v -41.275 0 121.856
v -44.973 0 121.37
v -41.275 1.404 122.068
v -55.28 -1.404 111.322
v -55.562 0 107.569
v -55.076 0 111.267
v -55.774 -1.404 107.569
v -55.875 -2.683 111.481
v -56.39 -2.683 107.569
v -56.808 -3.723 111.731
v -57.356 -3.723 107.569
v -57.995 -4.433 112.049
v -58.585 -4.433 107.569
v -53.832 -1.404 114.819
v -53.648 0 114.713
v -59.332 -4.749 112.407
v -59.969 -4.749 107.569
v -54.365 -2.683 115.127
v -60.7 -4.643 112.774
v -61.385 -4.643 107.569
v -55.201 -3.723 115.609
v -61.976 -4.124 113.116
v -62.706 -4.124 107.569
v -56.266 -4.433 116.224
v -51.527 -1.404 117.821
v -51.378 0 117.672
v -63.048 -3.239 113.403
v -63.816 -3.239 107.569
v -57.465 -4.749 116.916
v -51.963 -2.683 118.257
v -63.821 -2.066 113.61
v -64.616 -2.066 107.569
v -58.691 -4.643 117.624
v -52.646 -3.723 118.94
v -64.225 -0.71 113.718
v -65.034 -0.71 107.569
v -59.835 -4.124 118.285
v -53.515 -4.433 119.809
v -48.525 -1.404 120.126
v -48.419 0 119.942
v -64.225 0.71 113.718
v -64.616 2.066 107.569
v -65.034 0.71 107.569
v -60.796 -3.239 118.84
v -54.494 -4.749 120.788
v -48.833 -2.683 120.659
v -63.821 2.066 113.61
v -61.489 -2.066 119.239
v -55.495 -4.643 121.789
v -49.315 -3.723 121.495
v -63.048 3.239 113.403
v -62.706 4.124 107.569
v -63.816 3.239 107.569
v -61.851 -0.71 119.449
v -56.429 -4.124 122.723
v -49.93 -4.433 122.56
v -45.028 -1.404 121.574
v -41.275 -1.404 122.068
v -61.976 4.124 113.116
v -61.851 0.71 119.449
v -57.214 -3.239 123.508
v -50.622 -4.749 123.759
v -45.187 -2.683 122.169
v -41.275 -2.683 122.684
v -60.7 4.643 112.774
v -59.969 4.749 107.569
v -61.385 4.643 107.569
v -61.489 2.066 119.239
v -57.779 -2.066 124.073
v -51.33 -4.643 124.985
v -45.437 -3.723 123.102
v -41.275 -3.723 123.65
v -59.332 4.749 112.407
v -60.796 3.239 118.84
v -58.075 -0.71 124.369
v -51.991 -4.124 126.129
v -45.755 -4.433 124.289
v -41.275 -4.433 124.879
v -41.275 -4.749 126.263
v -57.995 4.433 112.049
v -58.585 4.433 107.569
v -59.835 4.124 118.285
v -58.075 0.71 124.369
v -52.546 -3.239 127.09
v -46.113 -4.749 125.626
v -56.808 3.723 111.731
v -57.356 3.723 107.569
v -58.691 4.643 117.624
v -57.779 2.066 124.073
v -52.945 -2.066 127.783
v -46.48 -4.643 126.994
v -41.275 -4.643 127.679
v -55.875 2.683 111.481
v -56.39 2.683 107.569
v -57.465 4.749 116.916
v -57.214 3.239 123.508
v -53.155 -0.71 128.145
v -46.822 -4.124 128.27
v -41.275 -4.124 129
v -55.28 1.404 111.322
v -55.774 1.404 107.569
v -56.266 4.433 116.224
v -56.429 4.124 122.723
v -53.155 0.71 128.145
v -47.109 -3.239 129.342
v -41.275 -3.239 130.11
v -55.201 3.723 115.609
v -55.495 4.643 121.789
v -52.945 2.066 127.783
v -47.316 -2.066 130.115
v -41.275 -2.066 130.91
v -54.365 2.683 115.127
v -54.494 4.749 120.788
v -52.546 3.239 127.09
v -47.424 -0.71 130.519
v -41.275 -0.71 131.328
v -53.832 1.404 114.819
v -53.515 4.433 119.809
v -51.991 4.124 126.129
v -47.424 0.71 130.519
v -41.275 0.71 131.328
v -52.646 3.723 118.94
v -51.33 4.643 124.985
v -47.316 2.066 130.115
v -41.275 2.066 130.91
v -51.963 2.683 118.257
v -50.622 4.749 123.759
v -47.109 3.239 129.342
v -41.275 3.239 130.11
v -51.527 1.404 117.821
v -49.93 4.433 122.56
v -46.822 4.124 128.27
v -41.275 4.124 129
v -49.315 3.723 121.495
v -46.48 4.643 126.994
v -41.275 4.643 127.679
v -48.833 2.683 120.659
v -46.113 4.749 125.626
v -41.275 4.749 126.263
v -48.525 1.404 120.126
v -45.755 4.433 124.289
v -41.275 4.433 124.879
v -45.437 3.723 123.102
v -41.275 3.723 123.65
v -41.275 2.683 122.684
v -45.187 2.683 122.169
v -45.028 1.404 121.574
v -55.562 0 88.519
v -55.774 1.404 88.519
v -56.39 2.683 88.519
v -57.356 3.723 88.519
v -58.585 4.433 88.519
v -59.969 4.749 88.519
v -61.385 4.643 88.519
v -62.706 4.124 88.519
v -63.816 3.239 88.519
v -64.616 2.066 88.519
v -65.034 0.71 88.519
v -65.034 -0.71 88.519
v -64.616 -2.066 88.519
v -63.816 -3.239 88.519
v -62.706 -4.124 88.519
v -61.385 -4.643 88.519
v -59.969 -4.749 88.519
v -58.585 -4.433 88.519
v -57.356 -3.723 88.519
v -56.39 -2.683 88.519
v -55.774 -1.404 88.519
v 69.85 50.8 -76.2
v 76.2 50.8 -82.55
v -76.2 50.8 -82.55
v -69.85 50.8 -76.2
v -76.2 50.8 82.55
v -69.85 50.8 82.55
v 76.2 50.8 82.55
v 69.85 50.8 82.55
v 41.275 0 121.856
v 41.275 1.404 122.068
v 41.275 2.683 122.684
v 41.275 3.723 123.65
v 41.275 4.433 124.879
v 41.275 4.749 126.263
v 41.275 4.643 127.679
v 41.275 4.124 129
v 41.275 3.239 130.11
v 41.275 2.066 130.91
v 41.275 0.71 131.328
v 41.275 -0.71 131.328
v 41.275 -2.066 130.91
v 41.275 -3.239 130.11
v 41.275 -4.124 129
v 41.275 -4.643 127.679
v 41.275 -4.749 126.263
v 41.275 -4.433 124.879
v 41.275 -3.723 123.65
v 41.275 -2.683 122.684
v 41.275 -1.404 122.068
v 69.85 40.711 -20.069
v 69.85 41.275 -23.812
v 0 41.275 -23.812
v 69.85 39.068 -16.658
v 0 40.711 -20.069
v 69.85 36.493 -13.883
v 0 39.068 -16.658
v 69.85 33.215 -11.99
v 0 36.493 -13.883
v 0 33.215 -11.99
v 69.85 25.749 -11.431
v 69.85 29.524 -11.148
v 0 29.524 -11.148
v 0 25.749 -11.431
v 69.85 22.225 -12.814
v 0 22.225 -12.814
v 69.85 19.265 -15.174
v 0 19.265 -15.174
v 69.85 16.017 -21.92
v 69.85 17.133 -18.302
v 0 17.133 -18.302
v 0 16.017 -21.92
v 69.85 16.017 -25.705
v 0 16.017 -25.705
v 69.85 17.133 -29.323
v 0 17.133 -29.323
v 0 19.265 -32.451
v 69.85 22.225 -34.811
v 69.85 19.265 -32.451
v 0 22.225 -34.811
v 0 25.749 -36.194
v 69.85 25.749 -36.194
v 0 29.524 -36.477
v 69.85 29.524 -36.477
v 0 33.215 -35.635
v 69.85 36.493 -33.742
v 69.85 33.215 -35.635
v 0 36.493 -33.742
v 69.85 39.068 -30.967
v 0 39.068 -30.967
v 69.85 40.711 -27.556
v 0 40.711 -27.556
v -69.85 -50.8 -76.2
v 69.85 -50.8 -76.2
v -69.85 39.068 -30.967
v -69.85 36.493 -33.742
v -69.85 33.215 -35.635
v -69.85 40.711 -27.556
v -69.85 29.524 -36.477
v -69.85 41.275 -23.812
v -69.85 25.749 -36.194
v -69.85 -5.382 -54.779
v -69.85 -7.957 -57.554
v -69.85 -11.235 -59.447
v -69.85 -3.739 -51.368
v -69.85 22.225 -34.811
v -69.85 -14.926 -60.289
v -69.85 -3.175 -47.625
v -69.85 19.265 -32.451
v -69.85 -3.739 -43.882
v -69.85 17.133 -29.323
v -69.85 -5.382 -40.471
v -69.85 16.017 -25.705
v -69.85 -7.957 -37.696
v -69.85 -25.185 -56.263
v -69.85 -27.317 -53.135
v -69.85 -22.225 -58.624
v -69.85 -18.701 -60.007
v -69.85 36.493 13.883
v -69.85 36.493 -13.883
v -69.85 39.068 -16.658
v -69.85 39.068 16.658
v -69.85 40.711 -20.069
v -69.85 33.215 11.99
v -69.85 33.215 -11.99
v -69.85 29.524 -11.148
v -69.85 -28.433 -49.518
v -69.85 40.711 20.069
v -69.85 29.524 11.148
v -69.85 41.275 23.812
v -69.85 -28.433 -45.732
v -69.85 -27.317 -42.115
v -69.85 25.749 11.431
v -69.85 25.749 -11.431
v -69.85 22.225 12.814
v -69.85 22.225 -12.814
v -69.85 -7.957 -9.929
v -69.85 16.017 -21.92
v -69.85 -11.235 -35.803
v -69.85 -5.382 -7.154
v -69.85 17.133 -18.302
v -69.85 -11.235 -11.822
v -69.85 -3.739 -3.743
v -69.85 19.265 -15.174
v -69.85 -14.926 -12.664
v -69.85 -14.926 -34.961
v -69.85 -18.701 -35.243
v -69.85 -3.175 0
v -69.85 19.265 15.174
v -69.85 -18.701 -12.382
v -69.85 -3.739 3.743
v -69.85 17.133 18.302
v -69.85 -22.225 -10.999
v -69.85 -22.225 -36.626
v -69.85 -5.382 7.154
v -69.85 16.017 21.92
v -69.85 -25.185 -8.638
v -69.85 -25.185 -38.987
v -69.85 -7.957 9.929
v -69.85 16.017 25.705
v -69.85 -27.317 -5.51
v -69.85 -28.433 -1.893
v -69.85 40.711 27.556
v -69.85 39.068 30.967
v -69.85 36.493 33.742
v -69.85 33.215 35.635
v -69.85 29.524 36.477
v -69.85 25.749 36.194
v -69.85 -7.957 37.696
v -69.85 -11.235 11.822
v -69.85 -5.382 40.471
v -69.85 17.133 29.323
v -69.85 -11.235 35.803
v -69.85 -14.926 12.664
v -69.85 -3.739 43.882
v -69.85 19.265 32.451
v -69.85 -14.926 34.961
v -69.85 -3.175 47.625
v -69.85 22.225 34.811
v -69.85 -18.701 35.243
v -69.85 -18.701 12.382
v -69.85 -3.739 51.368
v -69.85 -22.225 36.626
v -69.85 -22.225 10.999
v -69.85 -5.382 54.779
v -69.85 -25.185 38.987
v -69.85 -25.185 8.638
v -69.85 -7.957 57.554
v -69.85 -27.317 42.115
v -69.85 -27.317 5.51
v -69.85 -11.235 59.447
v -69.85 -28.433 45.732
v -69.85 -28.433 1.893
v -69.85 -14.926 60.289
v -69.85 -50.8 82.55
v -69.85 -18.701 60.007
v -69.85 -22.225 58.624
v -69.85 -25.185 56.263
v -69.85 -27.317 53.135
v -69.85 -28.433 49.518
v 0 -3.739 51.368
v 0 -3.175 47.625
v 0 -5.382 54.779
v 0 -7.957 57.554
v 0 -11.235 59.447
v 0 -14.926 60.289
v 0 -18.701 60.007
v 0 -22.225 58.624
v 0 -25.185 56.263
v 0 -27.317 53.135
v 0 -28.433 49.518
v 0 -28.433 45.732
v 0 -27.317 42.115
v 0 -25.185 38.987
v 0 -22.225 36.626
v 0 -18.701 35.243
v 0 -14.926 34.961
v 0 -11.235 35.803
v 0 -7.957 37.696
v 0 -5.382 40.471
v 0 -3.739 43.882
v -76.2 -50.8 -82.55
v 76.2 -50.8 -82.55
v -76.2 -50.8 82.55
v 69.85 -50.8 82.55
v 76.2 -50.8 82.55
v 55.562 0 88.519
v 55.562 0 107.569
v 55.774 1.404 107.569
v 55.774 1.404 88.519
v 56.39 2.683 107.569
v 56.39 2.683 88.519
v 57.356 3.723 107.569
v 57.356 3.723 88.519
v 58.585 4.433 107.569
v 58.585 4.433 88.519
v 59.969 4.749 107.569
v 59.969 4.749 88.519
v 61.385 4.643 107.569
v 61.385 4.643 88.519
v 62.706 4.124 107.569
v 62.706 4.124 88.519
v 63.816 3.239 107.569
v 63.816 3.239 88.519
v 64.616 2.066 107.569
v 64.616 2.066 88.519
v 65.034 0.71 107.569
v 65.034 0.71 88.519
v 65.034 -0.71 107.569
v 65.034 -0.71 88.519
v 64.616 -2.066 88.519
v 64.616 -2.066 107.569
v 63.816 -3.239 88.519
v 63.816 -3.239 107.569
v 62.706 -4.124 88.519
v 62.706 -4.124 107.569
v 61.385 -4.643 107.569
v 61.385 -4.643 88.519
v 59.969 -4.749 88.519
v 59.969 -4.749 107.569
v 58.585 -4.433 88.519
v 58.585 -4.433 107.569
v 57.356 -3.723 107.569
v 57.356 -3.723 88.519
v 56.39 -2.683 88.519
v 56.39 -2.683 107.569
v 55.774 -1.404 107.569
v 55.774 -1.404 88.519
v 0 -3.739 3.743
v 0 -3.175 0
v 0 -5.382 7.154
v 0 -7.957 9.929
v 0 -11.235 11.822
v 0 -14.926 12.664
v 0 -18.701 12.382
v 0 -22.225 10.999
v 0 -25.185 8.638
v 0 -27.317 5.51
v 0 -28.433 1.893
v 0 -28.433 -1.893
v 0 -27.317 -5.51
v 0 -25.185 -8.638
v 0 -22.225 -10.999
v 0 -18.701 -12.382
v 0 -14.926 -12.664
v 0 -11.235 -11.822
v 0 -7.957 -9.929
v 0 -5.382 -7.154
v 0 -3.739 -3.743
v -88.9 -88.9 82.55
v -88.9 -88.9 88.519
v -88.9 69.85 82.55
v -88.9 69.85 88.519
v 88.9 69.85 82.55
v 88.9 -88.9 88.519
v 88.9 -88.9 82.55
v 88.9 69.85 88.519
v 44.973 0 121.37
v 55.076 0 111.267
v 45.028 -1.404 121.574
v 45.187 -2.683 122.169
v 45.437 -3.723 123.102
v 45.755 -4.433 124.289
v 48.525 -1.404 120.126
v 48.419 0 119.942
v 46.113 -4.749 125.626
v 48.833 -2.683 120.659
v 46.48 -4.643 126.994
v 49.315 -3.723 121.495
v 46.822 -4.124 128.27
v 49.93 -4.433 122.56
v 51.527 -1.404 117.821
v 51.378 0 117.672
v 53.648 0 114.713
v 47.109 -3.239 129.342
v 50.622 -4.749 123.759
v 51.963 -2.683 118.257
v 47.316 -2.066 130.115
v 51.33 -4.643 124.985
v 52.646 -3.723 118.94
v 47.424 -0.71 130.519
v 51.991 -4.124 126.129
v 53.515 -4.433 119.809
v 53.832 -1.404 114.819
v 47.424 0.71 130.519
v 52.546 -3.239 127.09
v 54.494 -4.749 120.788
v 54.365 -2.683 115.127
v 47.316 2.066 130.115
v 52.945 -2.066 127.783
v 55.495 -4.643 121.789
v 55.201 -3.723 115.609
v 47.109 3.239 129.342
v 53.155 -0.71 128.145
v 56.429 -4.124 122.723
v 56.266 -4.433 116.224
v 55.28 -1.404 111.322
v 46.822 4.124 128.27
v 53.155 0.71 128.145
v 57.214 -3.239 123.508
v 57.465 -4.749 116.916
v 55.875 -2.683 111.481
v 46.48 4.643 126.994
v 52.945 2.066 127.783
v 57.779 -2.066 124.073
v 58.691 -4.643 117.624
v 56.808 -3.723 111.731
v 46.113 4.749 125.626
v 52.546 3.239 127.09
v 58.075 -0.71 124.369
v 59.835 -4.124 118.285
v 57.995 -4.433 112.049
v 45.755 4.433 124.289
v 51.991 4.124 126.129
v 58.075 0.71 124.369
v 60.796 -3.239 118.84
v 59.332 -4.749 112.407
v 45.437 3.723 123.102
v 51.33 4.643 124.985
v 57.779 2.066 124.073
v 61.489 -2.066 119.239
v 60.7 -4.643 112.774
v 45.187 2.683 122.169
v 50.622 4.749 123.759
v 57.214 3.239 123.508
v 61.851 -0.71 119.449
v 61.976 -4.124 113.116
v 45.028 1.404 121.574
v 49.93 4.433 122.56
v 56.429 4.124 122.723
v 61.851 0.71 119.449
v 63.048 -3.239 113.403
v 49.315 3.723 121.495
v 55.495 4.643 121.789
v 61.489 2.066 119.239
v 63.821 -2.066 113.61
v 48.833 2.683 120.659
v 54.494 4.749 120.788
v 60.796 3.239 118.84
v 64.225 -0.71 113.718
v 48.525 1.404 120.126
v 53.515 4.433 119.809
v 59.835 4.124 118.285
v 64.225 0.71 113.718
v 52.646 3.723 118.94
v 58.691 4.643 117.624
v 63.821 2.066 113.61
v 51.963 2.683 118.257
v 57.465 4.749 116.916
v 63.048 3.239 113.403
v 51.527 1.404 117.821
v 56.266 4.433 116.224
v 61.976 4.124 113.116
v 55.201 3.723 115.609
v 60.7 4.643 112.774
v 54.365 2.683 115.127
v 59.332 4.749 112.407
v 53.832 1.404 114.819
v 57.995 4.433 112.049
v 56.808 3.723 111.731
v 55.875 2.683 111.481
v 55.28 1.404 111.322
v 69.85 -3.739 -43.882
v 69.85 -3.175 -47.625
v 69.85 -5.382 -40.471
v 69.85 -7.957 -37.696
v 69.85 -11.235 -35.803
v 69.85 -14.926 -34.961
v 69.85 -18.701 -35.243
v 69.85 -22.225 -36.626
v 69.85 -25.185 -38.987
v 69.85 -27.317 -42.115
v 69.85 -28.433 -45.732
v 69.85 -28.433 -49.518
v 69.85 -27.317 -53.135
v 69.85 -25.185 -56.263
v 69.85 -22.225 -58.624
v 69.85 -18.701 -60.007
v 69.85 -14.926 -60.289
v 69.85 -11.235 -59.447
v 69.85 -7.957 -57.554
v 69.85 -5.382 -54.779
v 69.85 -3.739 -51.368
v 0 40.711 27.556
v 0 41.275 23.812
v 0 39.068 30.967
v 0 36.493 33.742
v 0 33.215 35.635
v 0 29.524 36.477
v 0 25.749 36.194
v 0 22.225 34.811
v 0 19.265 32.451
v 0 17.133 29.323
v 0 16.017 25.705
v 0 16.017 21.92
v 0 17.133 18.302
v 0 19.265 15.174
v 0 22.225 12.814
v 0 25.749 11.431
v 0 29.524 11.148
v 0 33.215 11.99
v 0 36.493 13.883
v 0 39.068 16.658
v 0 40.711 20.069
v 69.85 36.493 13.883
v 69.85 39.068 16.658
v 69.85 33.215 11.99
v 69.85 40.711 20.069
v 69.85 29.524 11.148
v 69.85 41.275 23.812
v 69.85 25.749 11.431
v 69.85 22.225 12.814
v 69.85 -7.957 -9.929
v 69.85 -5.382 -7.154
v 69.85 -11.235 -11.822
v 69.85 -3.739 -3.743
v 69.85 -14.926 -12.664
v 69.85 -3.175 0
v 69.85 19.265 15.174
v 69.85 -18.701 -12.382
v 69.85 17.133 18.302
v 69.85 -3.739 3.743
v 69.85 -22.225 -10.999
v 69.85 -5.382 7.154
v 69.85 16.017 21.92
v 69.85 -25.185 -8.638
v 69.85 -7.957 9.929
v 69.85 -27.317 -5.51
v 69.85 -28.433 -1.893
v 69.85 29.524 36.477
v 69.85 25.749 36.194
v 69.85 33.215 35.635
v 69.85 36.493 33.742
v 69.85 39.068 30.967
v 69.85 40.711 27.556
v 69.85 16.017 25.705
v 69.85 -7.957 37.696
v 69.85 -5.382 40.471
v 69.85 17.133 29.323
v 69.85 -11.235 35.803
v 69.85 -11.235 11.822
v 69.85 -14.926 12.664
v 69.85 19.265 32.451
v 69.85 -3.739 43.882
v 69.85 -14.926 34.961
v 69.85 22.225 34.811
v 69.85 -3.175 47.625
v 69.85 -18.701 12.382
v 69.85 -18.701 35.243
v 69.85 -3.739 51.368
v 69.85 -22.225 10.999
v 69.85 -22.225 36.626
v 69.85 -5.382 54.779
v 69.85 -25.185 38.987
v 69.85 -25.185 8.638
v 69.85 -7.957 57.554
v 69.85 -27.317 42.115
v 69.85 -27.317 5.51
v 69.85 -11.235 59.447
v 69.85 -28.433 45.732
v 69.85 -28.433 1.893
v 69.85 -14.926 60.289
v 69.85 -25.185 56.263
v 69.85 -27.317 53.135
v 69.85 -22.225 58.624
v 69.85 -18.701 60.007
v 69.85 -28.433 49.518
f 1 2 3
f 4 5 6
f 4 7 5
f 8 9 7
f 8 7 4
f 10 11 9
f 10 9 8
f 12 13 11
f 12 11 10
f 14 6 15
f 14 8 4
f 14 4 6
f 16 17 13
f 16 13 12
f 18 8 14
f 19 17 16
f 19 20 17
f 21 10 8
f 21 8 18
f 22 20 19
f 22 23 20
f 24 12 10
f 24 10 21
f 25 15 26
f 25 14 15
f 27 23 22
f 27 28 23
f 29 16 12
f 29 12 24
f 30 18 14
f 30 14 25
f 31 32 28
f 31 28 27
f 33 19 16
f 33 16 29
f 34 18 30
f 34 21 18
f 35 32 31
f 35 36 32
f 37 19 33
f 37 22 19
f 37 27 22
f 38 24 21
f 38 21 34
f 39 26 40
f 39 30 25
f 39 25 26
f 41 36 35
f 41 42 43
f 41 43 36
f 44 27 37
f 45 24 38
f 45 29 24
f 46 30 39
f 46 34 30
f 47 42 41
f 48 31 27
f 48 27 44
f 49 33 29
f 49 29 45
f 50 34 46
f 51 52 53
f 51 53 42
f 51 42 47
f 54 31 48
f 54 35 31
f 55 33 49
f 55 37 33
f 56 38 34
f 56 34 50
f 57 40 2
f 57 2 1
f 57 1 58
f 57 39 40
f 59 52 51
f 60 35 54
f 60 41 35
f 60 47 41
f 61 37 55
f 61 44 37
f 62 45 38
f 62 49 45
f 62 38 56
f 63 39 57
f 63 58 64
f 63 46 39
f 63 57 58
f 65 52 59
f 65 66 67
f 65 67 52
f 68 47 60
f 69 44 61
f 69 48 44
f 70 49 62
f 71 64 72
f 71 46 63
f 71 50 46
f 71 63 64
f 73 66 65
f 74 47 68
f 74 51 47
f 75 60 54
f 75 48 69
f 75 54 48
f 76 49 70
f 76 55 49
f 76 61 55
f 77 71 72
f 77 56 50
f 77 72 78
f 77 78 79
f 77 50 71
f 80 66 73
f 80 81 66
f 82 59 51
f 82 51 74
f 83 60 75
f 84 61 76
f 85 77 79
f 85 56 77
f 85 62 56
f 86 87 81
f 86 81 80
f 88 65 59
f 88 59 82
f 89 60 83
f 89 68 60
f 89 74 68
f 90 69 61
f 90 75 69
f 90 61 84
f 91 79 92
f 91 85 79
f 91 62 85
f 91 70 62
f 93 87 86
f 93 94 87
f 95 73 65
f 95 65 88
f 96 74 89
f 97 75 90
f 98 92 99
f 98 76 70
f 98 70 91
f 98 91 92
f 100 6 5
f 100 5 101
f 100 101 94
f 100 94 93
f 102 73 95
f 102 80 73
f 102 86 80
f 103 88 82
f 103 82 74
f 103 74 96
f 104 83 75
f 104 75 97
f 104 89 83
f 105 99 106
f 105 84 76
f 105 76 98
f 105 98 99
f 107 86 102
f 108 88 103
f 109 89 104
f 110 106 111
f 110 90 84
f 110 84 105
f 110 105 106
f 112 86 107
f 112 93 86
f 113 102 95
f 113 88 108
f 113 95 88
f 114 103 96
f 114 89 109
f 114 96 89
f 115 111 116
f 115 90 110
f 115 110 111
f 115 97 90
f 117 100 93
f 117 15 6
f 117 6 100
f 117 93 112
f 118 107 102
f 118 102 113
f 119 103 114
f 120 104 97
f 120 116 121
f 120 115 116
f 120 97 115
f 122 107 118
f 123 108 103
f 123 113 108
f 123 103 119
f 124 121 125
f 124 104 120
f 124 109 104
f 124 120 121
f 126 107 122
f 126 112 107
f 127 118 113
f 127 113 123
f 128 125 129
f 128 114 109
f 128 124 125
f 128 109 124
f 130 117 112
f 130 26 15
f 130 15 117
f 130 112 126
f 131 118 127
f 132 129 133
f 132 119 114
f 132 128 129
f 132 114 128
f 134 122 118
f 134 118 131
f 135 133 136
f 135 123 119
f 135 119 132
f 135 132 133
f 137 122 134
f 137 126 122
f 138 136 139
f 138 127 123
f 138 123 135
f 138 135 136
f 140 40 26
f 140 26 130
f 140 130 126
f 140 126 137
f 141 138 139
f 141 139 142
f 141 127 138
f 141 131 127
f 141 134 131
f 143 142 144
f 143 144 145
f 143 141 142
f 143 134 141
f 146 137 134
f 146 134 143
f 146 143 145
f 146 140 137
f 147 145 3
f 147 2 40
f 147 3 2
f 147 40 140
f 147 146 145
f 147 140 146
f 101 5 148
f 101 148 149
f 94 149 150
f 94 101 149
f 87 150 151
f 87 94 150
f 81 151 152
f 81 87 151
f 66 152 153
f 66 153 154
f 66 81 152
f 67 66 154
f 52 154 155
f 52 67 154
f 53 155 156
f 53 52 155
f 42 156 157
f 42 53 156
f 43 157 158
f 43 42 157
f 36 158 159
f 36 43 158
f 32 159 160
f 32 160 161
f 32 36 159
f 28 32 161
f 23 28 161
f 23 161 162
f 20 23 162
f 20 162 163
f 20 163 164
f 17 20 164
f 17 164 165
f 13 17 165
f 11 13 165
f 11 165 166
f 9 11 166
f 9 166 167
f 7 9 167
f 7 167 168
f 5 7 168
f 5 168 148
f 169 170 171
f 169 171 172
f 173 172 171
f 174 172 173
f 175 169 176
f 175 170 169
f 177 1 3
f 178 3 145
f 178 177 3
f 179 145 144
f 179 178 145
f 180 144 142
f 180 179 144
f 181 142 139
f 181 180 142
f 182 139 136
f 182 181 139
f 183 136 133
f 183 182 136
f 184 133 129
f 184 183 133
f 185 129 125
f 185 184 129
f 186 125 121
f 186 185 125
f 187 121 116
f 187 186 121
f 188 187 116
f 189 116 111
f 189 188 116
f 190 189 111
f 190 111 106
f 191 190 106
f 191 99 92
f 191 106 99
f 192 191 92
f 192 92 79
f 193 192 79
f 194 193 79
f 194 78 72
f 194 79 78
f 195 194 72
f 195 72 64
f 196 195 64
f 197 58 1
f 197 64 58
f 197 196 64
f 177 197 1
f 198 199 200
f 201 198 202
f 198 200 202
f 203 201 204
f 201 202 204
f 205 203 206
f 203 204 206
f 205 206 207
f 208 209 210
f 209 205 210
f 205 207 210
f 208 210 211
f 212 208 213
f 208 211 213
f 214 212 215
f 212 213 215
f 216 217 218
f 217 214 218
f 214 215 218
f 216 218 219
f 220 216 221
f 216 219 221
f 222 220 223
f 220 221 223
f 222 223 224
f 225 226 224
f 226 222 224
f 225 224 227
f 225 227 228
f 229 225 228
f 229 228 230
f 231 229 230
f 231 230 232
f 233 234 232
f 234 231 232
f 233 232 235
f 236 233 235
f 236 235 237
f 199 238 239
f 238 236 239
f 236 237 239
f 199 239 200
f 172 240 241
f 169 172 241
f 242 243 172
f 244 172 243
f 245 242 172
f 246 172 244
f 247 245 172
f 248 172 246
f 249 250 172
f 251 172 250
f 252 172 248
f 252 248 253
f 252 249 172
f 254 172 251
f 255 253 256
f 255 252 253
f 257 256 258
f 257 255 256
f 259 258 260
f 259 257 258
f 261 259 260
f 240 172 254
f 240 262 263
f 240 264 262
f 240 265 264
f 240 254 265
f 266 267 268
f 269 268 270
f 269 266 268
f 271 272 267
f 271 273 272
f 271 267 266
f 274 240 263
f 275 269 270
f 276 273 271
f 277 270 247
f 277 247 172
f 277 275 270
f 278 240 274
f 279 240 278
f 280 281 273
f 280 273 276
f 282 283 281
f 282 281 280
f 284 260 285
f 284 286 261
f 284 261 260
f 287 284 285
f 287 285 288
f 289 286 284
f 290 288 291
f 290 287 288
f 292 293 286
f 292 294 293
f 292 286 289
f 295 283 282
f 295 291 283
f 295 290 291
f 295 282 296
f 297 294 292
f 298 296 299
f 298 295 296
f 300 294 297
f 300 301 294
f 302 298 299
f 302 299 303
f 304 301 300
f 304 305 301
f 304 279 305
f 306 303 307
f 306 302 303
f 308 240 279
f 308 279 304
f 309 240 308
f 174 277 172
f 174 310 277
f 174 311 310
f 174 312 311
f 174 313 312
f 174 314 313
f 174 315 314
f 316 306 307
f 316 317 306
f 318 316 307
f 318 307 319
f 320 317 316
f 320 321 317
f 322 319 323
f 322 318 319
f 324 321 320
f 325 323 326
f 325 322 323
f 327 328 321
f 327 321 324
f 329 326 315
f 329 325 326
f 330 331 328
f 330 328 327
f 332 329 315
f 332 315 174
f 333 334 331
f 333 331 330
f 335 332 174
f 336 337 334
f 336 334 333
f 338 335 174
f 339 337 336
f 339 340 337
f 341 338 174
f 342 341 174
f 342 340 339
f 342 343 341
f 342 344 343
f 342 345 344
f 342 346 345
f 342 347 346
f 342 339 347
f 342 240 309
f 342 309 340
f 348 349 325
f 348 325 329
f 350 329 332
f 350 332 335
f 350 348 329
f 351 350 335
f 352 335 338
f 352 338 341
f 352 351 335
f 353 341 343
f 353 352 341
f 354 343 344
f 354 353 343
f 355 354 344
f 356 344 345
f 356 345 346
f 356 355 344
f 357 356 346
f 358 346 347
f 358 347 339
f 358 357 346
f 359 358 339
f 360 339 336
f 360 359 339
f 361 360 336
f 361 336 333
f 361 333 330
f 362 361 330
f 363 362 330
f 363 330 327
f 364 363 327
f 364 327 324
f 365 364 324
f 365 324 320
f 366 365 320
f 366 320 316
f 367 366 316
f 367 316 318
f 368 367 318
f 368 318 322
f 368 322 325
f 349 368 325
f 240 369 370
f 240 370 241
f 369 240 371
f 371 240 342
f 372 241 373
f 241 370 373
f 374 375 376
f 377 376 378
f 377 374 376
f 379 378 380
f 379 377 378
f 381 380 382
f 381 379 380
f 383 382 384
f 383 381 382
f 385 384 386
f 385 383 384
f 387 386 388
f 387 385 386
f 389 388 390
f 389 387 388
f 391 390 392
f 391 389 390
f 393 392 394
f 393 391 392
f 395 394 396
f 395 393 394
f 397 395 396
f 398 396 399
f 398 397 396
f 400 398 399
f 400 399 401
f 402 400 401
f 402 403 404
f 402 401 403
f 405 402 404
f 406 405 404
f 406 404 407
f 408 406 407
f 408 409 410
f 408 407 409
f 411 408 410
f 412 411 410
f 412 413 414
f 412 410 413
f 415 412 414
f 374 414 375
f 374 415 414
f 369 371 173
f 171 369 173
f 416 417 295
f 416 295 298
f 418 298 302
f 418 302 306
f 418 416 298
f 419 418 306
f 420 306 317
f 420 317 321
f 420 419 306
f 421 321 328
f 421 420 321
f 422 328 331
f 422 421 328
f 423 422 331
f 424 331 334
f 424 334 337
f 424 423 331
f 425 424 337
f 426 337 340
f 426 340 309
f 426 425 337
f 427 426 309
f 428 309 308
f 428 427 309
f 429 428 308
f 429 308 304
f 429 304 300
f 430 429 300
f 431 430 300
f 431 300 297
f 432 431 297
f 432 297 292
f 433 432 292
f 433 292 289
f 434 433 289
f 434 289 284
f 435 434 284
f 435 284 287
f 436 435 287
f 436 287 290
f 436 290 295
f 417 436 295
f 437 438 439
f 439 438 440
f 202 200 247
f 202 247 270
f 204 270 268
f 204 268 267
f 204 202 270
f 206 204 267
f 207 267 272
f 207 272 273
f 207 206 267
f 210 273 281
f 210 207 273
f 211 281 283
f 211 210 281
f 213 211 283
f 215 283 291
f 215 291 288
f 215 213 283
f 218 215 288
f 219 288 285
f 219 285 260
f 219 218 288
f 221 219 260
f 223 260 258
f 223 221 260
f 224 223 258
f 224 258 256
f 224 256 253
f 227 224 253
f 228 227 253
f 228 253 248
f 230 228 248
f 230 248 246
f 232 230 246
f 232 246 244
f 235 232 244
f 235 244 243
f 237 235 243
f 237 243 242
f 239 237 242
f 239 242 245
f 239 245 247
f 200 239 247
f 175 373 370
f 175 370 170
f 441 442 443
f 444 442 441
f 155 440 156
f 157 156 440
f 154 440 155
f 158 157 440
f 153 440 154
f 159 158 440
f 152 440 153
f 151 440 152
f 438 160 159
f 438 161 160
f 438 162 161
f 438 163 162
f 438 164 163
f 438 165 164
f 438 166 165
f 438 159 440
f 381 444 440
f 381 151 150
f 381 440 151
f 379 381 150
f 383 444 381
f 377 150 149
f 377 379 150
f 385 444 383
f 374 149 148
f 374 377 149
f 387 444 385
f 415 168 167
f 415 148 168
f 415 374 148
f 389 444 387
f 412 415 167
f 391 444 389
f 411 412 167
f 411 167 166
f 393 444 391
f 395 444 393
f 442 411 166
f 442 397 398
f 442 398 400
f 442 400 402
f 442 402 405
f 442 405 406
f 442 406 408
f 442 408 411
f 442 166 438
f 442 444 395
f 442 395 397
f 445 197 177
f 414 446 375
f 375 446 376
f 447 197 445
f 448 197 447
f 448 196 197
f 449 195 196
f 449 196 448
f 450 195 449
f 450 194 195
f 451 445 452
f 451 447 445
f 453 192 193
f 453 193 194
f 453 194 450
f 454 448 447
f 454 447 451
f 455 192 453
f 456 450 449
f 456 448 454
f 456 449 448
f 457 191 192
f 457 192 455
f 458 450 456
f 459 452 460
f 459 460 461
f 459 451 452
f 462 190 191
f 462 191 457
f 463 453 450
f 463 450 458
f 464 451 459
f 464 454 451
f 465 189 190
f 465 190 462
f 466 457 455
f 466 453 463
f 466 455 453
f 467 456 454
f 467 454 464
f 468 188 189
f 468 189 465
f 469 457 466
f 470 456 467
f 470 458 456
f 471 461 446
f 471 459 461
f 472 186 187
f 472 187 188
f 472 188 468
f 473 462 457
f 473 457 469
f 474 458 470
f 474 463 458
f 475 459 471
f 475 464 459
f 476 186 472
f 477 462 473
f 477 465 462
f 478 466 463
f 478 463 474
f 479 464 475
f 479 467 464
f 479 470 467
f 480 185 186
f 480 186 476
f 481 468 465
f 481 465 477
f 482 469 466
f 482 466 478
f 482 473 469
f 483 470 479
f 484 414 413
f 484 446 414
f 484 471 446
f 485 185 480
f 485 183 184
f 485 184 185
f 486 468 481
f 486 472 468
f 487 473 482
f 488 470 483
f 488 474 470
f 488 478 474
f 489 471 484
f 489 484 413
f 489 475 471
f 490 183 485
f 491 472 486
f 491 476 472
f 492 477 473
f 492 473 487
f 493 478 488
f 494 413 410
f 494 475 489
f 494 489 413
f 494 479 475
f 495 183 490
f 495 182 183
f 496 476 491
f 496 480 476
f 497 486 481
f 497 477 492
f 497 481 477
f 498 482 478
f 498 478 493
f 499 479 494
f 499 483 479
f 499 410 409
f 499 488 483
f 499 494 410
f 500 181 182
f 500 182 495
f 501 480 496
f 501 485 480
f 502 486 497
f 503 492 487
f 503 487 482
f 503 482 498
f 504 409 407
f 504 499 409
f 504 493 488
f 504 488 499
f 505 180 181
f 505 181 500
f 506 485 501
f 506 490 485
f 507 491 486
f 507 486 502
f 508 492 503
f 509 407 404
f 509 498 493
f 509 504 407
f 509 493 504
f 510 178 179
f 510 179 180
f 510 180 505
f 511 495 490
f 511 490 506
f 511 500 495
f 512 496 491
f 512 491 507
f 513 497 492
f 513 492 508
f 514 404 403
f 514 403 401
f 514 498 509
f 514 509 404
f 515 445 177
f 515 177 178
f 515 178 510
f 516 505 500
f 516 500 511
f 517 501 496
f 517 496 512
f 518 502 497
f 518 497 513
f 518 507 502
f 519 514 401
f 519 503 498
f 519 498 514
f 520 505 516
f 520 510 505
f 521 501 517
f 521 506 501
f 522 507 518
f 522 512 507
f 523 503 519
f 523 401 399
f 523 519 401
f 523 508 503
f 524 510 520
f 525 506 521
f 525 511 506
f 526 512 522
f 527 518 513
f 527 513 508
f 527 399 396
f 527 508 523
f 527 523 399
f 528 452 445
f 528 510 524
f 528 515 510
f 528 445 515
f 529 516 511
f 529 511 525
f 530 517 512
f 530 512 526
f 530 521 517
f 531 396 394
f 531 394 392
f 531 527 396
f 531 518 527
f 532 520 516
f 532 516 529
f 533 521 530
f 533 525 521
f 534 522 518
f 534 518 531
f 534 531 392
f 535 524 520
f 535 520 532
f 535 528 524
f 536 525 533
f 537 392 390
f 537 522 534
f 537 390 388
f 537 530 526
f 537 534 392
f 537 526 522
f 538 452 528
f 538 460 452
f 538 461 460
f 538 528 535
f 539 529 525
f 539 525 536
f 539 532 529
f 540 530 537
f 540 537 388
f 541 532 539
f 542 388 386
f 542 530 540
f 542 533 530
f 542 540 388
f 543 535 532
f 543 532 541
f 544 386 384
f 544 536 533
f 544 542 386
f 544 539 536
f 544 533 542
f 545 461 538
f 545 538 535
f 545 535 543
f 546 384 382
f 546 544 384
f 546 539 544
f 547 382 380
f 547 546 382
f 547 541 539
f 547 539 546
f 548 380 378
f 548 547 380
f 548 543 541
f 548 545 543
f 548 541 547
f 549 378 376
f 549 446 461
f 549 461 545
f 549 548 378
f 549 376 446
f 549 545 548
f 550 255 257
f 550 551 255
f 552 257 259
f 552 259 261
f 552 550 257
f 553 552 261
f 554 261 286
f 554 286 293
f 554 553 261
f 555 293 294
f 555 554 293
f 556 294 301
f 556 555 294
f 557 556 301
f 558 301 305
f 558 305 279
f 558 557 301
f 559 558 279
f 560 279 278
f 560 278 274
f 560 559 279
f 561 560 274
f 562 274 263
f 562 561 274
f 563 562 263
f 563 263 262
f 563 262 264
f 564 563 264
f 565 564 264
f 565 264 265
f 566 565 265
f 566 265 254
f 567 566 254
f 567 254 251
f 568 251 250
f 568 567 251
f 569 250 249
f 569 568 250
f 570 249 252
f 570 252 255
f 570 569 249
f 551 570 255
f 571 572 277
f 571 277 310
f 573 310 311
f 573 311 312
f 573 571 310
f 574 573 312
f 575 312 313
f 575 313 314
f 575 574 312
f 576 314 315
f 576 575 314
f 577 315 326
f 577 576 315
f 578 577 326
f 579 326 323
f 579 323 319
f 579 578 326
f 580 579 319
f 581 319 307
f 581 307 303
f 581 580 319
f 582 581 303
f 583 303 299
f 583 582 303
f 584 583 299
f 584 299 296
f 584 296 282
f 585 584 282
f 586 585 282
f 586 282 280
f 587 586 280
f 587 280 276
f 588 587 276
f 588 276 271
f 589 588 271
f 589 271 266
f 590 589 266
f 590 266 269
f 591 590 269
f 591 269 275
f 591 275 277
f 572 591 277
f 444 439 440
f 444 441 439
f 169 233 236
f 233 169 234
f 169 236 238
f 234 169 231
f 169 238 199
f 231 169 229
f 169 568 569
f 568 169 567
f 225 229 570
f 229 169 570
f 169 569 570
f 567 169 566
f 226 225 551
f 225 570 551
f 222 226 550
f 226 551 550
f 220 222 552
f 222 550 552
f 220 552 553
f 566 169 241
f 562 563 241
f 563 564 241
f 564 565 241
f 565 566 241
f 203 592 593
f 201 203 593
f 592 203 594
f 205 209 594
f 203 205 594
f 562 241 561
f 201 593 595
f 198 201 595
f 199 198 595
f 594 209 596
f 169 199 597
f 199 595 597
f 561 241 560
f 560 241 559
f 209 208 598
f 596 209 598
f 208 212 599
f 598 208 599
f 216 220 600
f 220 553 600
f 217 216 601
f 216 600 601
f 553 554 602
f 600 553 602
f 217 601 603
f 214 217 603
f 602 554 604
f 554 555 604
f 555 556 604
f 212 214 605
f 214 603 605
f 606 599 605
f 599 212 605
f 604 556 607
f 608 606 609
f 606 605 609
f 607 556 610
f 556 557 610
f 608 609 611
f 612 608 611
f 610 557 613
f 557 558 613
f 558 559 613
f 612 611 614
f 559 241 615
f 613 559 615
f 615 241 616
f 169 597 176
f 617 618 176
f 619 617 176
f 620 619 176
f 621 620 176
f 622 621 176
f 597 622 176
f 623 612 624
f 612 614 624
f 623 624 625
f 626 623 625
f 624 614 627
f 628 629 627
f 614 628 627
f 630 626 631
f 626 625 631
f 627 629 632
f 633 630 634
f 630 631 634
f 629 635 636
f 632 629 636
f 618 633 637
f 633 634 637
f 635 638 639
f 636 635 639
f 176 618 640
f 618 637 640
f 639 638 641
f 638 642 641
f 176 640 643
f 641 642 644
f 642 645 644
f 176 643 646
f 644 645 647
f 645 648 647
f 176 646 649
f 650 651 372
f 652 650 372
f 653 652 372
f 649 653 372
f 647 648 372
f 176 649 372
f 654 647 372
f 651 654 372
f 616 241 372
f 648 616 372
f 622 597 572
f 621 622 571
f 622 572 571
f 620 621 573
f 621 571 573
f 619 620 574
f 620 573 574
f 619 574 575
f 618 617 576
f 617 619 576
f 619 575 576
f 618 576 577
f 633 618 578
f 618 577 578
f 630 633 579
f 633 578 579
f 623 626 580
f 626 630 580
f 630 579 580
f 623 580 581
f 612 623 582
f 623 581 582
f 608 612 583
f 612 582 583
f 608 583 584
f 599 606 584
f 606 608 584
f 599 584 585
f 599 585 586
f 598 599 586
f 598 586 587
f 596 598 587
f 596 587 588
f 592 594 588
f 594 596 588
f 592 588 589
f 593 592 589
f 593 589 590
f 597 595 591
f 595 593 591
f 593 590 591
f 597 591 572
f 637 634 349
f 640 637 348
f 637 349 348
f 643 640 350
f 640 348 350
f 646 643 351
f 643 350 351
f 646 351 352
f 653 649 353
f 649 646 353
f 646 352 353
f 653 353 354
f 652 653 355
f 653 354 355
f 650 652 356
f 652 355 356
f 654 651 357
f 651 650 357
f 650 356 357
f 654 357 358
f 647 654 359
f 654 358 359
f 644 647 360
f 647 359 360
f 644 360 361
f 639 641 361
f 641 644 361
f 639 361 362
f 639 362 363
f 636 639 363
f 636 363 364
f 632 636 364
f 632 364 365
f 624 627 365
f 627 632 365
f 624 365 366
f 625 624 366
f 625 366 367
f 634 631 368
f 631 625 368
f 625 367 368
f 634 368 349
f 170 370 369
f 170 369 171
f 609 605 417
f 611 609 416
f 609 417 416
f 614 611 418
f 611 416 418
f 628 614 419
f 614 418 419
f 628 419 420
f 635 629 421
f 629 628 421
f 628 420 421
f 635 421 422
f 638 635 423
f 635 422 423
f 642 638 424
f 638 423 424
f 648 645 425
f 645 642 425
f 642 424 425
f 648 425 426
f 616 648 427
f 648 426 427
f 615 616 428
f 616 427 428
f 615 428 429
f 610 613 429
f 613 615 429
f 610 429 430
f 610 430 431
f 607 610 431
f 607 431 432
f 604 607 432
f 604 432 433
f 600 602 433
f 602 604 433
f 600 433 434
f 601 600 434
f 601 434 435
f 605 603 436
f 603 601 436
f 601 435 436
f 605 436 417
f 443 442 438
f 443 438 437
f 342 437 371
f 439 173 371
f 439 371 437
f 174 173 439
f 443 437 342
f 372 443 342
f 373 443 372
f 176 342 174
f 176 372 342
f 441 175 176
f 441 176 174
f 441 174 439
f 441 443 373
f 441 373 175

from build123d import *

# Parameters (mm, degrees)
F0_W     = 101.6
F0_H     = 165.1
F0_R     = 15.875
F1_DEPTH = 76.2
F2_W     = 139.7
F2_H     = 158.75
F3_DEPTH = 101.601
F4_R     = 12.7
F5_DEPTH = 73.025
F7_DEPTH = 88.9
F8_R     = 4.7625


with BuildPart() as f1:
    # F0 (on Right) → F1 (new body, symmetric)
    with BuildSketch(Plane.YZ):
        Rectangle(F0_W, F0_H)
        with Locations((-25.4, -57.15)):
            Circle(F0_R, mode=Mode.SUBTRACT)
        with Locations((-25.4, 0)):
            Circle(F0_R, mode=Mode.SUBTRACT)
        with Locations((25.4, -28.575)):
            Circle(F0_R, mode=Mode.SUBTRACT)
        with Locations((-25.4, 57.15)):
            Circle(F0_R, mode=Mode.SUBTRACT)
        with Locations((25.4, 28.575)):
            Circle(F0_R, mode=Mode.SUBTRACT)
        with Locations((-25.4, 57.15)):
            Circle(F0_R)
        with Locations((25.4, 28.575)):
            Circle(F0_R)
        with Locations((-25.4, 0)):
            Circle(F0_R)
        with Locations((25.4, -28.575)):
            Circle(F0_R)
        with Locations((-25.4, -57.15)):
            Circle(F0_R)
    extrude(amount=F1_DEPTH, both=True)

    # F2 (on face) → F3 (cut, through all)
    with BuildSketch(Plane.XZ.offset(50.8)):
        with Locations((0, 3.175)):
            Rectangle(F2_W, F2_H)
    extrude(amount=-F3_DEPTH, mode=Mode.SUBTRACT)

    # F4 (on Right) → F5 (join, symmetric)
    with BuildSketch(Plane.YZ):
        with Locations((-15.875, 47.625)):
            Circle(F4_R)
        with Locations((28.575, 23.8125)):
            Circle(F4_R)
        with Locations((-15.875, 0)):
            Circle(F4_R)
        with Locations((28.575, -23.8125)):
            Circle(F4_R)
        with Locations((-15.875, -47.625)):
            Circle(F4_R)
    extrude(amount=F5_DEPTH, both=True)

    # F6 (on Right) → F7 (join, symmetric)
    with BuildSketch(Plane.YZ):
        Polygon((-50.8, 82.55), (50.8, 82.55), (69.85, 82.55), (69.85, 88.519), (-88.9, 88.519), (-88.9, 82.55), align=None)
    extrude(amount=F7_DEPTH, both=True)

    # F10: sweep along a path in F9
    with BuildLine(Plane.XZ) as f10_path:
        Line((-60.325, 88.519), (-60.325, 107.569))
        ThreePointArc((-60.325, 107.569), (-54.7453841816, 121.0393841816), (-41.275, 126.619))
        Line((-41.275, 126.619), (41.275, 126.619))
        ThreePointArc((41.275, 126.619), (54.7453841816, 121.0393841816), (60.325, 107.569))
        Line((60.325, 107.569), (60.325, 88.519))
    # F8 (on face) → F10 (sweep)
    with BuildSketch(Plane.XY.offset(88.519)):
        with Locations((-60.325, 0)):
            Circle(F8_R)
    sweep(path=f10_path.line)


solid = f1.part
